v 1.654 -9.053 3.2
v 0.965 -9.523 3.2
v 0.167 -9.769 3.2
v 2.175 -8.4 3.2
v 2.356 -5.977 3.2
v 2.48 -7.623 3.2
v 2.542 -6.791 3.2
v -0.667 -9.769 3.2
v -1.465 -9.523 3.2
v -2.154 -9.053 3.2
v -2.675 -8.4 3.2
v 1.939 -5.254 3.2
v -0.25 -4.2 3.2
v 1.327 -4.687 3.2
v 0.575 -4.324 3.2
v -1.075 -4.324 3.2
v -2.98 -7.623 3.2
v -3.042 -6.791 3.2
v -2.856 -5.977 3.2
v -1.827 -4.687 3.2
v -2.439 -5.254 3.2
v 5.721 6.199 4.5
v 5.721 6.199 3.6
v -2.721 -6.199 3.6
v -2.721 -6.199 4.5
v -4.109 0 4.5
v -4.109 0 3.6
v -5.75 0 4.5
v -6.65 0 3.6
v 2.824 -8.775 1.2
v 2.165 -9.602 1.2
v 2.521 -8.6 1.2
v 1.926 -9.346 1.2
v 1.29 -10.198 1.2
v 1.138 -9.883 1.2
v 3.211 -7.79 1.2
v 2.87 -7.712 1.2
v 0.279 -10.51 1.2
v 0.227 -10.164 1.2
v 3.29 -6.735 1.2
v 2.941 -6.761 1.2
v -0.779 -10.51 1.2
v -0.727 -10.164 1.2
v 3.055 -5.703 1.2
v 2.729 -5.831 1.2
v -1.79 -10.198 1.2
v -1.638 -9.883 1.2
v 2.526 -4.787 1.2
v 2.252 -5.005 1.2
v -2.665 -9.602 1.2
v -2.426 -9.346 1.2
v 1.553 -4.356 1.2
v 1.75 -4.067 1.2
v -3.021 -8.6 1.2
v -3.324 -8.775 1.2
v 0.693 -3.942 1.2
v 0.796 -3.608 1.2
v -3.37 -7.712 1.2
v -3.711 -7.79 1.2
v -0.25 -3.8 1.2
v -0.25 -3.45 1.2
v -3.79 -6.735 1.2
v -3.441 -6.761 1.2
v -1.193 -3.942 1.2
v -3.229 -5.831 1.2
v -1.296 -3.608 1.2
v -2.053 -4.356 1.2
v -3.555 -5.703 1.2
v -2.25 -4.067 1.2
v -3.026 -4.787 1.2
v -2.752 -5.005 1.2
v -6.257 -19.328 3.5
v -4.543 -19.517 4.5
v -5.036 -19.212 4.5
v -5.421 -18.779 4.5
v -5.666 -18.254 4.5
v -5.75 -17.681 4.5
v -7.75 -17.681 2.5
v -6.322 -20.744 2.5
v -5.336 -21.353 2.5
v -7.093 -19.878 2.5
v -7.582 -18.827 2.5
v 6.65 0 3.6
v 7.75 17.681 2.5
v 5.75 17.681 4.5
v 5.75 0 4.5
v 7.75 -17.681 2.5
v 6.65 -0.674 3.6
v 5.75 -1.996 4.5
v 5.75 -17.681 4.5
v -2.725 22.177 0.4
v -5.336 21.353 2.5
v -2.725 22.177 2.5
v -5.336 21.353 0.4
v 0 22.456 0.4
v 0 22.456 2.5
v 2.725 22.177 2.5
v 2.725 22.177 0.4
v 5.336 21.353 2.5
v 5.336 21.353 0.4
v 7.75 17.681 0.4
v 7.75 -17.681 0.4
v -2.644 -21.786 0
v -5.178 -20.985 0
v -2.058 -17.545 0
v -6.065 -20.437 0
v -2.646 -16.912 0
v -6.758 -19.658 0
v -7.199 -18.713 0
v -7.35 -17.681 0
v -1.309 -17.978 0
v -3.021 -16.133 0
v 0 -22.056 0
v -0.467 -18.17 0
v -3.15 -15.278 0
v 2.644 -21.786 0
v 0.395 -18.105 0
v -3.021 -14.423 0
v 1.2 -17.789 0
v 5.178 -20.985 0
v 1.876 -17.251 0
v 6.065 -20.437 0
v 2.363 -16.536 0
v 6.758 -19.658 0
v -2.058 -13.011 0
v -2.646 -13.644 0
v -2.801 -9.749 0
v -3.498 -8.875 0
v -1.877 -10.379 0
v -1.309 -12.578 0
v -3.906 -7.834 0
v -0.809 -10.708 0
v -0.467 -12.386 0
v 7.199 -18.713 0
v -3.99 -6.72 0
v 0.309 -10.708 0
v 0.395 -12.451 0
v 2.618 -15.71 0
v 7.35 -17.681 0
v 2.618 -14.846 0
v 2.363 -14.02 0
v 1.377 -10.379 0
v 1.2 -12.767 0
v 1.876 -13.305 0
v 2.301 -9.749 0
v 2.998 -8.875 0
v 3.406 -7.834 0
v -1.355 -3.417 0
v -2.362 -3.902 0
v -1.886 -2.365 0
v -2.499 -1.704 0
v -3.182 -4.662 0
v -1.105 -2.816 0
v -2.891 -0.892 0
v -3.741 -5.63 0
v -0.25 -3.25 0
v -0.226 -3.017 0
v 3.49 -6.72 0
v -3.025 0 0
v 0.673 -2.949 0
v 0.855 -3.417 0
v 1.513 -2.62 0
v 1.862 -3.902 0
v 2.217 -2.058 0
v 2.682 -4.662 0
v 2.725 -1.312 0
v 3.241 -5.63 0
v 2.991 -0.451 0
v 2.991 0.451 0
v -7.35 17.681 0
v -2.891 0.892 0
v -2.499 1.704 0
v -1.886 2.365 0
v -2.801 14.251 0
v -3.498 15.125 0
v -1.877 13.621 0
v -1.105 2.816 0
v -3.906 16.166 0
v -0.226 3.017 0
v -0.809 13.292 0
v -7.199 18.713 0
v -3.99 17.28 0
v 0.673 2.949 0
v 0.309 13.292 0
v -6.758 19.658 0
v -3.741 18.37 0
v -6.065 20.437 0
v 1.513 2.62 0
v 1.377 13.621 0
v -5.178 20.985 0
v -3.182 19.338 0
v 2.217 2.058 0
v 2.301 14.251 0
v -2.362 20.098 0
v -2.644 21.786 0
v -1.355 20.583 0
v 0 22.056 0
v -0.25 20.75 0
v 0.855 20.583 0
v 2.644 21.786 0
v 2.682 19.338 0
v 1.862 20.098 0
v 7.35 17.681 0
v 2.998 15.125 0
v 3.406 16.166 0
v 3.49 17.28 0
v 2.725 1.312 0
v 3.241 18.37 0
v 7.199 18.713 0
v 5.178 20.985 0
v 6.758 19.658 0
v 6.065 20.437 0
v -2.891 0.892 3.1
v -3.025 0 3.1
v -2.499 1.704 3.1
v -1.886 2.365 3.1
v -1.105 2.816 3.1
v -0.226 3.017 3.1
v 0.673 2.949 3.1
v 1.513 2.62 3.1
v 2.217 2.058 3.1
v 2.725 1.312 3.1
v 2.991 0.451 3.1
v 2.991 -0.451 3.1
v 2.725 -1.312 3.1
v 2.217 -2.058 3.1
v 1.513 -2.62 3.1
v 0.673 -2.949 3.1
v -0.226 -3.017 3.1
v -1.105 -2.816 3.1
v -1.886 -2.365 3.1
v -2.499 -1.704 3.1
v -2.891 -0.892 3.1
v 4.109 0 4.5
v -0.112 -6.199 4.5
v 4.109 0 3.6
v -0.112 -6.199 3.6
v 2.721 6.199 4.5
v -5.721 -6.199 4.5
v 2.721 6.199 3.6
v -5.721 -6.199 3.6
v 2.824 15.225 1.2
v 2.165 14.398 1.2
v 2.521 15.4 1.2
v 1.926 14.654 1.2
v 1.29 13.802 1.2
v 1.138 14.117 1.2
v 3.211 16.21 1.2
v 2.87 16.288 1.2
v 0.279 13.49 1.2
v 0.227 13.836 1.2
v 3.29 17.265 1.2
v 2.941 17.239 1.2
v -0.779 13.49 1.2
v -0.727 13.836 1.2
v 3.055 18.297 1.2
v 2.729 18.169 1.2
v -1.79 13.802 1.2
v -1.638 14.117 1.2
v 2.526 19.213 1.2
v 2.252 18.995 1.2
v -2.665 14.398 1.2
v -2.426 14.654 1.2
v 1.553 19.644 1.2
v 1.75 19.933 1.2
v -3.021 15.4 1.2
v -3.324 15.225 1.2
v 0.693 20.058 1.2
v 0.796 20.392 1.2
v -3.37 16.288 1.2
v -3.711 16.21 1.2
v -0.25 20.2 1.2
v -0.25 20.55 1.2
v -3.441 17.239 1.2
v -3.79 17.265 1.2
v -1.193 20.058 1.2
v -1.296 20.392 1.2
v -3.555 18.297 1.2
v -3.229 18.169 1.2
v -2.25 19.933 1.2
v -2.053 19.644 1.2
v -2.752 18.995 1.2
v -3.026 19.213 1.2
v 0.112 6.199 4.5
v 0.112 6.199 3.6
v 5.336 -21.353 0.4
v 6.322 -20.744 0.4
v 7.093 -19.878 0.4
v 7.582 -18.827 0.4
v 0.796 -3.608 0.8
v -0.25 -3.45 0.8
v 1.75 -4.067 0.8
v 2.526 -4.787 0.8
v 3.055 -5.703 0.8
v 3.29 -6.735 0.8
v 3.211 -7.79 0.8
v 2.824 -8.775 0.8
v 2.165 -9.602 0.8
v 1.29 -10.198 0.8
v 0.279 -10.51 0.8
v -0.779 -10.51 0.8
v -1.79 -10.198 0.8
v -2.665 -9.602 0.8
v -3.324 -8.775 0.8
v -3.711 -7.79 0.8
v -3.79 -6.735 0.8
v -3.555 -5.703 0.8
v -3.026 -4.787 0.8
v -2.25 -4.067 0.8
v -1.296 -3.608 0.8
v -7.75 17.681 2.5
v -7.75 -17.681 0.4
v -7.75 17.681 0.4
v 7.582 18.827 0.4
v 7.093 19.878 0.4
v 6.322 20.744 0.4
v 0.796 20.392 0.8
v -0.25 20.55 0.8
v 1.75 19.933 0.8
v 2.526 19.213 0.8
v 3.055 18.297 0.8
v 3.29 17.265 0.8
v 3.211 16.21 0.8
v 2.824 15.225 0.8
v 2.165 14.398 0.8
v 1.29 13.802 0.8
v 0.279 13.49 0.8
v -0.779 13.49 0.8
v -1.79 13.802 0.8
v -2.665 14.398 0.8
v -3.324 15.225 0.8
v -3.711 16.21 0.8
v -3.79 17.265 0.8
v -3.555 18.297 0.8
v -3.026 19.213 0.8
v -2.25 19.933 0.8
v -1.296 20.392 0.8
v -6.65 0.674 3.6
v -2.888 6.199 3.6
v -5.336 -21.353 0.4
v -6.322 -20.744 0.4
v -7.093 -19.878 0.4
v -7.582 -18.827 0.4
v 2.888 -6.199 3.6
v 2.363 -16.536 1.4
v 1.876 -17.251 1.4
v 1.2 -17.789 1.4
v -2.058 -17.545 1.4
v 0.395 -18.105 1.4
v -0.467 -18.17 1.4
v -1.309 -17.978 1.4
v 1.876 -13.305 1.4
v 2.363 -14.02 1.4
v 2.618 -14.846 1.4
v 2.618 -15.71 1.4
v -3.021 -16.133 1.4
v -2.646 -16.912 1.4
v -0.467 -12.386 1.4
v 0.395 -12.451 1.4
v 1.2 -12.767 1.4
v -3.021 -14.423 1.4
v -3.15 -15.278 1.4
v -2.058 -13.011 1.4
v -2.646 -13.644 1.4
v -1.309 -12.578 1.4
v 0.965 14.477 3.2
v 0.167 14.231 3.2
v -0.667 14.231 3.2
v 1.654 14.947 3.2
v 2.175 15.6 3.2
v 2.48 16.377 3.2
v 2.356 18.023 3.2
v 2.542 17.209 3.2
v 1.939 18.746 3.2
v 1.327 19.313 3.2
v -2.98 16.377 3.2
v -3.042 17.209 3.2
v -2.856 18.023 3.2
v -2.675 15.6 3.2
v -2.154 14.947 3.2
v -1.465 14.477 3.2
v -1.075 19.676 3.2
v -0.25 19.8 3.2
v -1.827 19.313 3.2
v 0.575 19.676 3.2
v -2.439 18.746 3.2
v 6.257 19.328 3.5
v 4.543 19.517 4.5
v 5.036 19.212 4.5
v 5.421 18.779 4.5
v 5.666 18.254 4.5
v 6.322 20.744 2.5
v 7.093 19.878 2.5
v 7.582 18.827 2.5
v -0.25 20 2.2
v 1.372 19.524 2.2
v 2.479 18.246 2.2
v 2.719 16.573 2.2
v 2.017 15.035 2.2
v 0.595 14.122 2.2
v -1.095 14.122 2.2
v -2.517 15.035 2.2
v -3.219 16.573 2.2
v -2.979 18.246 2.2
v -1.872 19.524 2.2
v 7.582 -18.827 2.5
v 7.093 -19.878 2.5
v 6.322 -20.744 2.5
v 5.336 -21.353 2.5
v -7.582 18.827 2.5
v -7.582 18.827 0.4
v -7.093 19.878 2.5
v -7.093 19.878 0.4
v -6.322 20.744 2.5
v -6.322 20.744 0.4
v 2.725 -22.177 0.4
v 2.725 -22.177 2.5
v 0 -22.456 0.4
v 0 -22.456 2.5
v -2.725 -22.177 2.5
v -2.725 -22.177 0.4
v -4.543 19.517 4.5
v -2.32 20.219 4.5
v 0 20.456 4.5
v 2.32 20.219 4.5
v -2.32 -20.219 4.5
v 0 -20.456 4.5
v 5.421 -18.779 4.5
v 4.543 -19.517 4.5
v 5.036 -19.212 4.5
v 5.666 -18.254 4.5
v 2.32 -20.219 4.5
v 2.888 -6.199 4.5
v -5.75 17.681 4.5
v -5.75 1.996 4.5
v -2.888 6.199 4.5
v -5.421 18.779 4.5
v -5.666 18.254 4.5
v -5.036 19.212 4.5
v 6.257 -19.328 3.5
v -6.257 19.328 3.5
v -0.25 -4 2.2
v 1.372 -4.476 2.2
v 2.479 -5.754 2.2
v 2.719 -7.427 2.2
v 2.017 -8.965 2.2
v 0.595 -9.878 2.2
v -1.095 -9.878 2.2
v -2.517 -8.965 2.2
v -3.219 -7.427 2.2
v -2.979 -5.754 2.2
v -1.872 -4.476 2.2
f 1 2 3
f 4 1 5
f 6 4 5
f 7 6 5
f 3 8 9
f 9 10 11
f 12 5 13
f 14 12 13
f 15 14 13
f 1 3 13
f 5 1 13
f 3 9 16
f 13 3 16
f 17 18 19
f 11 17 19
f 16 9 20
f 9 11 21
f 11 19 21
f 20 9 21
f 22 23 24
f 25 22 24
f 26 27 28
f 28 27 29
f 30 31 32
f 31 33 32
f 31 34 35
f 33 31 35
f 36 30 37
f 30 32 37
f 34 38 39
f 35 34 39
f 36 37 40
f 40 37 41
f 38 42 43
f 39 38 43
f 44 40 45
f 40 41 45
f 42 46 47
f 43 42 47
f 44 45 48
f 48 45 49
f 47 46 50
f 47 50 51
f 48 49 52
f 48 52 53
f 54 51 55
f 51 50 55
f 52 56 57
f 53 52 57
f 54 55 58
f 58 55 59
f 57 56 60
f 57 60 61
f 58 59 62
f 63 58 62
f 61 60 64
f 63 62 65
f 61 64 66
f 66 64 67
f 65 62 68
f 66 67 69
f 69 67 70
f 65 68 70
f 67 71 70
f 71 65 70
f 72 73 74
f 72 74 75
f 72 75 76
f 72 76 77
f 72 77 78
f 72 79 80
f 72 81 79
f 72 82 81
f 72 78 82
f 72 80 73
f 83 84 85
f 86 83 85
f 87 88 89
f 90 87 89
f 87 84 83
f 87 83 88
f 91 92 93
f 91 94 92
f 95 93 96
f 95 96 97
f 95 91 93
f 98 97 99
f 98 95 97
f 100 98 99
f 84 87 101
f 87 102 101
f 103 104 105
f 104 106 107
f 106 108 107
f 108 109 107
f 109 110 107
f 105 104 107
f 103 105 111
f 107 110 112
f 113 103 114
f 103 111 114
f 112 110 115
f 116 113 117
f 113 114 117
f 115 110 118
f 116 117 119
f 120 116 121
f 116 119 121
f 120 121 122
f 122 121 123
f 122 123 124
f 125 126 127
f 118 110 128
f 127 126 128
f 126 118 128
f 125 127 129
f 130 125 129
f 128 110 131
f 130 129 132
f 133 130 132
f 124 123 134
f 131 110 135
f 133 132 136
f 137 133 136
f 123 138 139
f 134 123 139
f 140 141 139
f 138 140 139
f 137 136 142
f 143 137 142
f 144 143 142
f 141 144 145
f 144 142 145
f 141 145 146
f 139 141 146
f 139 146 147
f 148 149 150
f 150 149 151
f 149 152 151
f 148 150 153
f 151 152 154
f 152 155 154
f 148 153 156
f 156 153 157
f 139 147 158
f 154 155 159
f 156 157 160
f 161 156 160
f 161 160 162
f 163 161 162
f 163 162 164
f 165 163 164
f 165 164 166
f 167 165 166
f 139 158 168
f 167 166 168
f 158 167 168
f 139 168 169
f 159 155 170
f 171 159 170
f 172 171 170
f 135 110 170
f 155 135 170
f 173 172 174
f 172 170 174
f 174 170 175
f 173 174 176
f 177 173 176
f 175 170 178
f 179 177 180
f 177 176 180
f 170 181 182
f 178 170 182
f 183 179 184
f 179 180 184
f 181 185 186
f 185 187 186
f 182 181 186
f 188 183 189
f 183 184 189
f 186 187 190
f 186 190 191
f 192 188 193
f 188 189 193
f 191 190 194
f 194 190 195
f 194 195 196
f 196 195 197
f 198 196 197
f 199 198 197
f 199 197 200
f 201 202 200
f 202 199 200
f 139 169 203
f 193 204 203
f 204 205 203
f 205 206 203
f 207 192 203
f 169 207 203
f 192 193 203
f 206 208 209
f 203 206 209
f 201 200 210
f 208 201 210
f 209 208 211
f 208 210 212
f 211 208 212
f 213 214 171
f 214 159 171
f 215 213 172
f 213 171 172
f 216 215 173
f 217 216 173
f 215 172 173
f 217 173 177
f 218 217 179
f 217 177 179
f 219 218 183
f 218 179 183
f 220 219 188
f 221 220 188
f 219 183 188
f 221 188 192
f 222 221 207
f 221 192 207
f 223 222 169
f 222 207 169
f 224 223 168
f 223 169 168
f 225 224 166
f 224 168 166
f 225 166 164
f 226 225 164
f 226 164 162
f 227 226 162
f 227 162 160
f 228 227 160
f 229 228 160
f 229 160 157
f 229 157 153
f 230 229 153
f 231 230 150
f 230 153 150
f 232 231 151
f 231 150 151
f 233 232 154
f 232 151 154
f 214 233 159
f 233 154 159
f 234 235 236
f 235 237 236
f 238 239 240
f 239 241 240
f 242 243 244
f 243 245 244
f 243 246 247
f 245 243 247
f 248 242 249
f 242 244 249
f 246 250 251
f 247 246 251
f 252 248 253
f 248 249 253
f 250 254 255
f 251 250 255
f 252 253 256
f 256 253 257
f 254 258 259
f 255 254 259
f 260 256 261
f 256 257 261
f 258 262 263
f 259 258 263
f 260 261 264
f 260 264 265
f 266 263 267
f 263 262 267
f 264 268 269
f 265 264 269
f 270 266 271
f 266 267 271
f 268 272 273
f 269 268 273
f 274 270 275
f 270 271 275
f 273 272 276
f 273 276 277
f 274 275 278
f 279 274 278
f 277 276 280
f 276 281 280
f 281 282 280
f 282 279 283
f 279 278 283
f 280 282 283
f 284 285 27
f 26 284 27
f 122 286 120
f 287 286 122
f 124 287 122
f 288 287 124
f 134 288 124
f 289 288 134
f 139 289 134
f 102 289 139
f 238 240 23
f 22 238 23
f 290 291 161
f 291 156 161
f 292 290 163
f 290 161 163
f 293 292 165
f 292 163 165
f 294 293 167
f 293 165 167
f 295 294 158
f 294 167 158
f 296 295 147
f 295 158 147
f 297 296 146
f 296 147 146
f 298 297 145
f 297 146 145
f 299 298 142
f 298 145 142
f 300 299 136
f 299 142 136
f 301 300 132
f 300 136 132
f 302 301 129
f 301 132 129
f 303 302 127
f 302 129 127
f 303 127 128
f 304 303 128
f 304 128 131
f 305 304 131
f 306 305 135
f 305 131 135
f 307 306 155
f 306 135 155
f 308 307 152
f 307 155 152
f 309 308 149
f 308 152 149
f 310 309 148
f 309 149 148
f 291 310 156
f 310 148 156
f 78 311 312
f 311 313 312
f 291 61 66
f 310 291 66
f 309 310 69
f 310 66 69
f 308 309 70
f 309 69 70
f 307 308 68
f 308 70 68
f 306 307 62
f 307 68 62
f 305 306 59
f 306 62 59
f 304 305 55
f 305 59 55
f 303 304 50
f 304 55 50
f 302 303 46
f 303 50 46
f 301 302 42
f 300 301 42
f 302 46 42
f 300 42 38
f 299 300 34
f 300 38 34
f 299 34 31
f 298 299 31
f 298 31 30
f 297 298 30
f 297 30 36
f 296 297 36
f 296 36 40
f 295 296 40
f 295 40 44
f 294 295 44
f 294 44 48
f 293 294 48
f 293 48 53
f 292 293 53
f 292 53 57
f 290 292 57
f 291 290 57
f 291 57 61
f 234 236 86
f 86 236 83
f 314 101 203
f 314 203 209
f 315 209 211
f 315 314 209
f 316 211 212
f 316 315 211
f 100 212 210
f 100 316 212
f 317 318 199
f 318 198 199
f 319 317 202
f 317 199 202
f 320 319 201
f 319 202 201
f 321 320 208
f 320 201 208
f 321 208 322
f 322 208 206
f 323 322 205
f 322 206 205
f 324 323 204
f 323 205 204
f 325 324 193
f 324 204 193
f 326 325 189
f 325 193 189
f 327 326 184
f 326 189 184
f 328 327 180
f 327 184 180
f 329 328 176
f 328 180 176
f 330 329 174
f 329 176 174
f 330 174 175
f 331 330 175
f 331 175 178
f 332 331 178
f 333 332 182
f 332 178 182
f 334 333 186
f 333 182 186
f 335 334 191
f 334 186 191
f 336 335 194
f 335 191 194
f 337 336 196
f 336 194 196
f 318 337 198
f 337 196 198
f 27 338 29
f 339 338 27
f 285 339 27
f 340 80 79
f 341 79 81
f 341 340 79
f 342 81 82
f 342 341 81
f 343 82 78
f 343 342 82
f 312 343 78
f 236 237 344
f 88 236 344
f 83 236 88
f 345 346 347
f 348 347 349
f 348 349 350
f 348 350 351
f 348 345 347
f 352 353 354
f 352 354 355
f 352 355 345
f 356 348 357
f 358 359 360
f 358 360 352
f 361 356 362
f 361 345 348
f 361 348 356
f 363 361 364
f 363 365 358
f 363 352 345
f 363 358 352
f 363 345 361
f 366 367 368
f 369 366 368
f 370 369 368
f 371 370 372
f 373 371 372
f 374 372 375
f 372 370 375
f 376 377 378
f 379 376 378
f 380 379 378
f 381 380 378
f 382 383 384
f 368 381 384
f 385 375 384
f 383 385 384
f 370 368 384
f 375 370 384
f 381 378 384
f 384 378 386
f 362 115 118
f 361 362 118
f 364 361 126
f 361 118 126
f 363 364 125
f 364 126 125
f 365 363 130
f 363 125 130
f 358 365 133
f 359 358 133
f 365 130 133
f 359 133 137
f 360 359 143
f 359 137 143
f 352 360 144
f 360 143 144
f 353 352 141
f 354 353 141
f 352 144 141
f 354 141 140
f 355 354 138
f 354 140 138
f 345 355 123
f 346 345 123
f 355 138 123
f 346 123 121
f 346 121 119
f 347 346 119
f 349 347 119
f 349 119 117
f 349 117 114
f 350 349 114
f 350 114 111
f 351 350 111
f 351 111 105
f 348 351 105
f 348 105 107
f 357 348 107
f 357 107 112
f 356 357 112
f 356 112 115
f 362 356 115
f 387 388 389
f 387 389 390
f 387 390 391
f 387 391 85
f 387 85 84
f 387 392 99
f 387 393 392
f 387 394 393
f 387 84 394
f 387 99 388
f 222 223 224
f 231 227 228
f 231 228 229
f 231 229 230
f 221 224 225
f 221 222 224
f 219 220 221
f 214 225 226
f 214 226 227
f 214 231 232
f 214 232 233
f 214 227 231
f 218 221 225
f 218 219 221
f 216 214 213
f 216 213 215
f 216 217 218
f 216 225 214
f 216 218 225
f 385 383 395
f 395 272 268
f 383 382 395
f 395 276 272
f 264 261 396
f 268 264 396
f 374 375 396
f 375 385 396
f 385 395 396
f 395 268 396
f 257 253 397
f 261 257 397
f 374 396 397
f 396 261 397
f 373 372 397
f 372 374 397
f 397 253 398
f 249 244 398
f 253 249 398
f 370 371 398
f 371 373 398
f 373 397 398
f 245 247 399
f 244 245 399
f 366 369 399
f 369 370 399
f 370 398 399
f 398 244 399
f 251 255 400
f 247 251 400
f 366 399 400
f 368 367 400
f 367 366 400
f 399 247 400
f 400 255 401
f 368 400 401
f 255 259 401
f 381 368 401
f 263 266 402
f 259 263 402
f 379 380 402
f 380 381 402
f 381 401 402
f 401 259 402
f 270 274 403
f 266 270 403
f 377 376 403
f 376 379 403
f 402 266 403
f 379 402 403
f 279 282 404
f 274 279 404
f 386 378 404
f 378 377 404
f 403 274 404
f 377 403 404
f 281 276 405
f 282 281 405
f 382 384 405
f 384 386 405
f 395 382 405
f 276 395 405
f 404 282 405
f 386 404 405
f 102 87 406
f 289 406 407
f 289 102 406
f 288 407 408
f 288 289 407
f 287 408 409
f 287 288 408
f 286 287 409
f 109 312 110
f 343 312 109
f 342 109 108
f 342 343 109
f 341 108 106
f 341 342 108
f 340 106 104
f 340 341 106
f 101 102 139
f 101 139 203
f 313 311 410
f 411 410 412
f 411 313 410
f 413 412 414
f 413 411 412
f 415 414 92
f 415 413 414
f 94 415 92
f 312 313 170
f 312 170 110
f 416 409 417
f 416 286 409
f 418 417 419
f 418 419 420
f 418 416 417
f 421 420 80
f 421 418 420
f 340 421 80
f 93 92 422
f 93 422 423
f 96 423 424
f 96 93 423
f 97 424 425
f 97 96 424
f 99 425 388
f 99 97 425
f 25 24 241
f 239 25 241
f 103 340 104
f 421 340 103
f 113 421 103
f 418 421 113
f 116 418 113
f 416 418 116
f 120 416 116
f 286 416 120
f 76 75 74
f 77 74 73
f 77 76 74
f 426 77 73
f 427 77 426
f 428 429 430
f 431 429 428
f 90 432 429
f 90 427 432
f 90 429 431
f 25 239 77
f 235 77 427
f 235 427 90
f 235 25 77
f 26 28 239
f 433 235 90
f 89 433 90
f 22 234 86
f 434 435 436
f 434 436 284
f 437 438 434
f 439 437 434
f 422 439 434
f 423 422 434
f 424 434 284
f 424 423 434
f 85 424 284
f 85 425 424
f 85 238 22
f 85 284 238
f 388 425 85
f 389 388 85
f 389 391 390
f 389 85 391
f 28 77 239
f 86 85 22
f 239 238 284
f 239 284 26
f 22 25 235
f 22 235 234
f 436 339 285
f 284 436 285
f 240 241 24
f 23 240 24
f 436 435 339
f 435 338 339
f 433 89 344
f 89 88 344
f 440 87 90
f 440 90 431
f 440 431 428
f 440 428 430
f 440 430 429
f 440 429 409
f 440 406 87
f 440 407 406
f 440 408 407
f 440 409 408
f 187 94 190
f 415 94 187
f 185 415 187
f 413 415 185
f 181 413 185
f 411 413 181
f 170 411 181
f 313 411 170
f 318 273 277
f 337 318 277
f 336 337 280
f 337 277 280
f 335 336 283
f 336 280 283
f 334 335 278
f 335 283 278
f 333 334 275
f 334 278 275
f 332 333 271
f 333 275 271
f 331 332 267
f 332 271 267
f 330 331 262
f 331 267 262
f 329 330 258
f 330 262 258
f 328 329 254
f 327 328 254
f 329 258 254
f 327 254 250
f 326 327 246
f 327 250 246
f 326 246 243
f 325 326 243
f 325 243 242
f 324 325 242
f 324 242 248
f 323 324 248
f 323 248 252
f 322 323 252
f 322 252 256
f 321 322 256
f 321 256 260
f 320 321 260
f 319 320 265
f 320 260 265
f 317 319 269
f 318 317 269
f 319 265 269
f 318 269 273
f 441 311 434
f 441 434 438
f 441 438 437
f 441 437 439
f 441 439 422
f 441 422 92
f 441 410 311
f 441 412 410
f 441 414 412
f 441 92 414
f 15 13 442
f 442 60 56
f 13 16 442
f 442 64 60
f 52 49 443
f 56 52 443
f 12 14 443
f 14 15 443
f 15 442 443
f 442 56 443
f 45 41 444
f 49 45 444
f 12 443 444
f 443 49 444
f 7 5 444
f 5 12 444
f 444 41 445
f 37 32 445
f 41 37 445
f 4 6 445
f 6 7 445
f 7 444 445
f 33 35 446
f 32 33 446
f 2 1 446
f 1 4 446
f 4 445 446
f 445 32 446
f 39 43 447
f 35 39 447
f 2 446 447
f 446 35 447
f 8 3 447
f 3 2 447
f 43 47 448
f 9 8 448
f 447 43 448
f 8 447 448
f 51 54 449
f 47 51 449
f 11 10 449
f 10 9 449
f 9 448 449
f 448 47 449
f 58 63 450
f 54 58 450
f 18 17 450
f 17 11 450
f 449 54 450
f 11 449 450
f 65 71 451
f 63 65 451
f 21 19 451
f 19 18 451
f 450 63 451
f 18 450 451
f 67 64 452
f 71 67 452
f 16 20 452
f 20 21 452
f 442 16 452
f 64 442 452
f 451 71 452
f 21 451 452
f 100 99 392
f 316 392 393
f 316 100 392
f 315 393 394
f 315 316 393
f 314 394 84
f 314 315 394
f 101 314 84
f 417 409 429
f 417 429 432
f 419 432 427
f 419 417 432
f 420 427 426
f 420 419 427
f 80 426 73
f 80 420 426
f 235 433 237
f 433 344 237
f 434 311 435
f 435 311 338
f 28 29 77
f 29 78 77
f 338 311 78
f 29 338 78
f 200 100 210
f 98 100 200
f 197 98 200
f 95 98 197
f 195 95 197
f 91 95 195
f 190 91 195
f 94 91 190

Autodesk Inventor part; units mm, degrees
ref_plane "YZ Plane" through (0, 0, 0) normal (1, 0, 0) x (0, 1, 0)
ref_plane "XZ Plane" through (0, 0, 0) normal (0, 1, 0) x (-1, 0, 0)
ref_plane "XY Plane" through (0, 0, 0) normal (0, 0, 1) x (1, 0, 0)
sketch "Skizze1" plane through (0, 0, 0) normal (0, 0, 1) x (1, 0, 0)
  line L0 (7.75, -17.6806) -> (7.75, 17.6806) projected
  line L1 (-7.75, 17.6806) -> (-7.75, -17.6806) projected
  circle A0 centre (0, 0) radius 3.025 projected
  arc A1 (-5.3363, -21.3526) -> (5.3363, -21.3526) centre (0, -9) ccw projected
  arc A2 (5.3363, -21.3526) -> (7.75, -17.6806) centre (3.75, -17.6806) ccw projected
  arc A3 (7.75, 17.6806) -> (5.3363, 21.3526) centre (3.75, 17.6806) ccw projected
  arc A4 (5.3363, 21.3526) -> (-5.3363, 21.3526) centre (0, 9) ccw projected
  arc A5 (-5.3363, 21.3526) -> (-7.75, 17.6806) centre (-3.75, 17.6806) ccw projected
  arc A6 (-7.75, -17.6806) -> (-5.3363, -21.3526) centre (-3.75, -17.6806) ccw projected
  circle A7 centre (-0.25, 17) radius 1.7 projected
  circle A8 centre (-0.25, -7) radius 1.7 projected
  line L2 (5.34, 14.1) -> (3.3, 14.1) projected
  line L3 (3.3, 14.1) -> (3.3, 17.74) projected
  line L4 (3.3, 17.74) -> (5.34, 17.74) projected
  line L5 (5.34, 17.74) -> (5.34, 14.1) projected
  line L6 (-3.8, 14.1) -> (-5.84, 14.1) projected
  line L7 (-5.84, 14.1) -> (-5.84, 17.74) projected
  line L8 (-5.84, 17.74) -> (-3.8, 17.74) projected
  line L9 (-3.8, 17.74) -> (-3.8, 14.1) projected
  circle A9 centre (-0.25, -15.278) radius 2.9 projected
  point P0 (0, 0)
  point P1 (-17.1225, -5.975)
  point P2 (-17.1225, -12.025)
  point P3 (-17.1225, 6.3)
  point P4 (-17.1225, -14.3)
  point P5 (-17.1225, -17.7)
extrude "Extrusion1" add sketch "Skizze1" along normal blind 4 contours A2 A1 A6 L1 A5 A4 A3 L0 | A0 | A7 | A8 | L2 L3 L4 L5 | L6 L7 L8 L9 | A9
sketch "Skizze2" plane through (0, 0, 0) normal (0, 0, -1) x (-1, 0, 0)
  circle A0 centre (0, 0) radius 3.025 projected
  arc A1 (-5.3363, -21.3526) -> (5.3363, -21.3526) centre (0, -9) ccw projected
  arc A2 (-7.75, -17.6806) -> (-5.3363, -21.3526) centre (-3.75, -17.6806) ccw projected
  line L0 (-7.75, -17.6806) -> (-7.75, 17.6806) projected
  arc A3 (-5.3363, 21.3526) -> (-7.75, 17.6806) centre (-3.75, 17.6806) ccw projected
  arc A4 (5.3363, 21.3526) -> (-5.3363, 21.3526) centre (0, 9) ccw projected
  arc A5 (7.75, 17.6806) -> (5.3363, 21.3526) centre (3.75, 17.6806) ccw projected
  line L1 (7.75, 17.6806) -> (7.75, -17.6806) projected
  arc A6 (5.3363, -21.3526) -> (7.75, -17.6806) centre (3.75, -17.6806) ccw projected
  circle A7 centre (0.25, 17) radius 1.7 projected
  circle A8 centre (0.25, -7) radius 1.7 projected
  line L2 (-5.34, 14.1) -> (-3.3, 14.1) projected
  line L3 (-3.3, 14.1) -> (-3.3, 17.74) projected
  line L4 (-3.3, 17.74) -> (-5.34, 17.74) projected
  line L5 (-5.34, 17.74) -> (-5.34, 14.1) projected
  line L6 (3.8, 14.1) -> (5.84, 14.1) projected
  line L7 (5.84, 14.1) -> (5.84, 17.74) projected
  line L8 (5.84, 17.74) -> (3.8, 17.74) projected
  line L9 (3.8, 17.74) -> (3.8, 14.1) projected
  circle A9 centre (0.25, -15.278) radius 2.9 projected
  point P0 (0, 0)
extrude "Extrusion2" cut sketch "Skizze2" against normal blind 3.1 contours A0
sketch "Skizze3" plane through (0, 0, 0) normal (0, 0, -1) x (-1, 0, 0)
  circle A0 centre (0, 0) radius 3.025 projected
  arc A1 (-5.3363, -21.3526) -> (5.3363, -21.3526) centre (0, -9) ccw projected
  arc A2 (-7.75, -17.6806) -> (-5.3363, -21.3526) centre (-3.75, -17.6806) ccw projected
  line L0 (-7.75, -17.6806) -> (-7.75, 17.6806) projected
  arc A3 (-5.3363, 21.3526) -> (-7.75, 17.6806) centre (-3.75, 17.6806) ccw projected
  arc A4 (5.3363, 21.3526) -> (-5.3363, 21.3526) centre (0, 9) ccw projected
  arc A5 (7.75, 17.6806) -> (5.3363, 21.3526) centre (3.75, 17.6806) ccw projected
  line L1 (7.75, 17.6806) -> (7.75, -17.6806) projected
  arc A6 (5.3363, -21.3526) -> (7.75, -17.6806) centre (3.75, -17.6806) ccw projected
  circle A7 centre (0.25, 17) radius 1.7 projected
  circle A8 centre (0.25, -7) radius 1.7 projected
  line L2 (-5.34, 14.1) -> (-3.3, 14.1) projected
  line L3 (-3.3, 14.1) -> (-3.3, 17.74) projected
  line L4 (-3.3, 17.74) -> (-5.34, 17.74) projected
  line L5 (-5.34, 17.74) -> (-5.34, 14.1) projected
  line L6 (3.8, 14.1) -> (5.84, 14.1) projected
  line L7 (5.84, 14.1) -> (5.84, 17.74) projected
  line L8 (5.84, 17.74) -> (3.8, 17.74) projected
  line L9 (3.8, 17.74) -> (3.8, 14.1) projected
  circle A9 centre (0.25, -15.278) radius 2.9 projected
  point P0 (0, 0)
hole "Bohrung1" at (-0.25, 17, 0) at (-0.25, -7, 0) direction (0, 0, 1) diameter 5.6 depth 3.2 counterbore diameter 7.1 counterbore depth 1.2
sketch "Skizze4" plane through (0, 0, 4) normal (0, 0, 1) x (1, 0, 0)
  circle A0 centre (-0.25, 17) radius 3.55 projected
  circle A1 centre (-0.25, -7) radius 3.55 projected
  circle A2 centre (0, 0) radius 3.025 projected
  arc A3 (5.3363, -21.3526) -> (7.75, -17.6806) centre (3.75, -17.6806) ccw projected
  arc A4 (-5.3363, -21.3526) -> (5.3363, -21.3526) centre (0, -9) ccw projected
  arc A5 (-7.75, -17.6806) -> (-5.3363, -21.3526) centre (-3.75, -17.6806) ccw projected
  line L0 (-7.75, 17.6806) -> (-7.75, -17.6806) projected
  arc A6 (-5.3363, 21.3526) -> (-7.75, 17.6806) centre (-3.75, 17.6806) ccw projected
  arc A7 (5.3363, 21.3526) -> (-5.3363, 21.3526) centre (0, 9) ccw projected
  arc A8 (7.75, 17.6806) -> (5.3363, 21.3526) centre (3.75, 17.6806) ccw projected
  line L1 (7.75, -17.6806) -> (7.75, 17.6806) projected
  circle A9 centre (12.6079, -10) radius 2.8
  circle A10 centre (12.6079, -10) radius 2.8
  line L2 (4.1087, 0) -> (7.1087, 0)
  line L3 (7.1087, 0) -> (2.8877, -6.1994)
  line L4 (2.8877, -6.1994) -> (-0.1123, -6.1994)
  line L5 (-0.1123, -6.1994) -> (4.1087, 0)
  line L6 (2.721, 6.1994) -> (5.721, 6.1994)
  line L7 (5.721, 6.1994) -> (-2.721, -6.1994)
  line L8 (-2.721, -6.1994) -> (-5.721, -6.1994)
  line L9 (-5.721, -6.1994) -> (2.721, 6.1994)
  line L10 (-2.8877, 6.1994) -> (0.1123, 6.1994)
  line L11 (0.1123, 6.1994) -> (-4.1087, 0)
  line L12 (-4.1087, 0) -> (-7.1087, 0)
  line L13 (-7.1087, 0) -> (-2.8877, 6.1994)
  line L14 (7.1087, 6.1994) -> (7.1087, -6.1994)
  line L15 (7.1087, -6.1994) -> (-7.1087, -6.1994)
  line L16 (-7.1087, -6.1994) -> (-7.1087, 6.1994)
  line L17 (-7.1087, 6.1994) -> (7.1087, 6.1994)
  point P0 (0, 0)
  point P1 (16.5579, -10)
  point P2 (16.5579, -10)
  point P3 (16.5579, -10)
  point P4 (50.5428, -9.282)
  point P5 (-4.221, -6.1994)
  point P6 (4.221, 6.1994)
  point P7 (-1.3877, 6.1994)
  point P8 (1.3877, -6.1994)
  dimension "d89" = 5.6
  dimension "d104" = 5.6
  dimension "d107" = 14.2174
  dimension "d108" = 12.3988
  dimension "d109" = 2.1563
  dimension "d110" = 2.1563
  dimension "d111" = 2.4798
  dimension "d112" = 2.4798
  dimension "d113" = 2.4798
  dimension "d114" = 6.1994
  dimension "d115" = 6.1994
  dimension "d116" = 6.1994
  dimension "d117" = 15.5
  dimension "d118" = 0.6413
move faces "Verschieben1" translate (0, 0, 0.5) faces at (-2.5833, -5.8935, 4)
extrude "Extrusion4" cut sketch "Skizze4" along normal mid plane 0.8 contours L8 L9 A2 L7 A1 | A1 L7 L8 | L3 L4 L5 A1 | A1 L5 L2 L3 | A2 L9 L7 | A2 L9 L6 L7 | L13 L10 L11 L12
extrude "Extrusion5" cut sketch "Skizze4" along normal through all contours L8 L9 A2 L7 A1 | A1 L7 L8 | L3 L4 L5 A1 | A1 L5 L2 L3 | A2 L9 L7 | A2 L9 L6 L7 | L13 L10 L11 L12
sketch "Skizze5" plane through (0, 0, 0) normal (0, 0, -1) x (-1, 0, 0)
  circle A0 centre (0.25, -15.278) radius 2.9 projected
  point P0 (0, 0)
extrude "Extrusion6" cut sketch "Skizze5" against normal blind 1.4
chamfer "Fase2" distance 0.2 distance2 0.8 1 edges at (-0.25, -10.55, 0) measured on face at (6.175, 0, 0)
chamfer "Fase3" distance 2 distance2 0.4 1 edges at (-0.25, -9.8, 1.2) measured on face at (0.1992, -4.2363, 2.5333)
chamfer "Fase4" distance 2 distance2 0.4 1 edges at (-0.25, 14.2, 1.2) measured on face at (0.1992, 19.7637, 2.5333)
chamfer "Fase5" distance 0.2 distance2 0.8 1 edges at (-0.25, 13.45, 0) measured on face at (6.175, 0, 0)
chamfer "Fase6" distance 0.4 angle 45 8 edges at (-7.75, 0, 0) (-7.0925, -19.8777, 0) (0, -22.4559, 0) (7.0925, -19.8777, 0) (7.75, 0, 0) (7.0925, 19.8777, 0) (0, 22.4559, 0) (-7.0925, 19.8777, 0)
chamfer "Fase7" distance 2 angle 45 8 edges at (7.75, 0, 4.5) (7.0925, 19.8777, 4.5) (0, 22.4559, 4.5) (-7.0925, 19.8777, 4.5) (-7.75, 0, 4.5) (-7.0925, -19.8777, 4.5) (0, -22.4559, 4.5) (7.0925, -19.8777, 4.5)
properties part number "Cover_Angled"
